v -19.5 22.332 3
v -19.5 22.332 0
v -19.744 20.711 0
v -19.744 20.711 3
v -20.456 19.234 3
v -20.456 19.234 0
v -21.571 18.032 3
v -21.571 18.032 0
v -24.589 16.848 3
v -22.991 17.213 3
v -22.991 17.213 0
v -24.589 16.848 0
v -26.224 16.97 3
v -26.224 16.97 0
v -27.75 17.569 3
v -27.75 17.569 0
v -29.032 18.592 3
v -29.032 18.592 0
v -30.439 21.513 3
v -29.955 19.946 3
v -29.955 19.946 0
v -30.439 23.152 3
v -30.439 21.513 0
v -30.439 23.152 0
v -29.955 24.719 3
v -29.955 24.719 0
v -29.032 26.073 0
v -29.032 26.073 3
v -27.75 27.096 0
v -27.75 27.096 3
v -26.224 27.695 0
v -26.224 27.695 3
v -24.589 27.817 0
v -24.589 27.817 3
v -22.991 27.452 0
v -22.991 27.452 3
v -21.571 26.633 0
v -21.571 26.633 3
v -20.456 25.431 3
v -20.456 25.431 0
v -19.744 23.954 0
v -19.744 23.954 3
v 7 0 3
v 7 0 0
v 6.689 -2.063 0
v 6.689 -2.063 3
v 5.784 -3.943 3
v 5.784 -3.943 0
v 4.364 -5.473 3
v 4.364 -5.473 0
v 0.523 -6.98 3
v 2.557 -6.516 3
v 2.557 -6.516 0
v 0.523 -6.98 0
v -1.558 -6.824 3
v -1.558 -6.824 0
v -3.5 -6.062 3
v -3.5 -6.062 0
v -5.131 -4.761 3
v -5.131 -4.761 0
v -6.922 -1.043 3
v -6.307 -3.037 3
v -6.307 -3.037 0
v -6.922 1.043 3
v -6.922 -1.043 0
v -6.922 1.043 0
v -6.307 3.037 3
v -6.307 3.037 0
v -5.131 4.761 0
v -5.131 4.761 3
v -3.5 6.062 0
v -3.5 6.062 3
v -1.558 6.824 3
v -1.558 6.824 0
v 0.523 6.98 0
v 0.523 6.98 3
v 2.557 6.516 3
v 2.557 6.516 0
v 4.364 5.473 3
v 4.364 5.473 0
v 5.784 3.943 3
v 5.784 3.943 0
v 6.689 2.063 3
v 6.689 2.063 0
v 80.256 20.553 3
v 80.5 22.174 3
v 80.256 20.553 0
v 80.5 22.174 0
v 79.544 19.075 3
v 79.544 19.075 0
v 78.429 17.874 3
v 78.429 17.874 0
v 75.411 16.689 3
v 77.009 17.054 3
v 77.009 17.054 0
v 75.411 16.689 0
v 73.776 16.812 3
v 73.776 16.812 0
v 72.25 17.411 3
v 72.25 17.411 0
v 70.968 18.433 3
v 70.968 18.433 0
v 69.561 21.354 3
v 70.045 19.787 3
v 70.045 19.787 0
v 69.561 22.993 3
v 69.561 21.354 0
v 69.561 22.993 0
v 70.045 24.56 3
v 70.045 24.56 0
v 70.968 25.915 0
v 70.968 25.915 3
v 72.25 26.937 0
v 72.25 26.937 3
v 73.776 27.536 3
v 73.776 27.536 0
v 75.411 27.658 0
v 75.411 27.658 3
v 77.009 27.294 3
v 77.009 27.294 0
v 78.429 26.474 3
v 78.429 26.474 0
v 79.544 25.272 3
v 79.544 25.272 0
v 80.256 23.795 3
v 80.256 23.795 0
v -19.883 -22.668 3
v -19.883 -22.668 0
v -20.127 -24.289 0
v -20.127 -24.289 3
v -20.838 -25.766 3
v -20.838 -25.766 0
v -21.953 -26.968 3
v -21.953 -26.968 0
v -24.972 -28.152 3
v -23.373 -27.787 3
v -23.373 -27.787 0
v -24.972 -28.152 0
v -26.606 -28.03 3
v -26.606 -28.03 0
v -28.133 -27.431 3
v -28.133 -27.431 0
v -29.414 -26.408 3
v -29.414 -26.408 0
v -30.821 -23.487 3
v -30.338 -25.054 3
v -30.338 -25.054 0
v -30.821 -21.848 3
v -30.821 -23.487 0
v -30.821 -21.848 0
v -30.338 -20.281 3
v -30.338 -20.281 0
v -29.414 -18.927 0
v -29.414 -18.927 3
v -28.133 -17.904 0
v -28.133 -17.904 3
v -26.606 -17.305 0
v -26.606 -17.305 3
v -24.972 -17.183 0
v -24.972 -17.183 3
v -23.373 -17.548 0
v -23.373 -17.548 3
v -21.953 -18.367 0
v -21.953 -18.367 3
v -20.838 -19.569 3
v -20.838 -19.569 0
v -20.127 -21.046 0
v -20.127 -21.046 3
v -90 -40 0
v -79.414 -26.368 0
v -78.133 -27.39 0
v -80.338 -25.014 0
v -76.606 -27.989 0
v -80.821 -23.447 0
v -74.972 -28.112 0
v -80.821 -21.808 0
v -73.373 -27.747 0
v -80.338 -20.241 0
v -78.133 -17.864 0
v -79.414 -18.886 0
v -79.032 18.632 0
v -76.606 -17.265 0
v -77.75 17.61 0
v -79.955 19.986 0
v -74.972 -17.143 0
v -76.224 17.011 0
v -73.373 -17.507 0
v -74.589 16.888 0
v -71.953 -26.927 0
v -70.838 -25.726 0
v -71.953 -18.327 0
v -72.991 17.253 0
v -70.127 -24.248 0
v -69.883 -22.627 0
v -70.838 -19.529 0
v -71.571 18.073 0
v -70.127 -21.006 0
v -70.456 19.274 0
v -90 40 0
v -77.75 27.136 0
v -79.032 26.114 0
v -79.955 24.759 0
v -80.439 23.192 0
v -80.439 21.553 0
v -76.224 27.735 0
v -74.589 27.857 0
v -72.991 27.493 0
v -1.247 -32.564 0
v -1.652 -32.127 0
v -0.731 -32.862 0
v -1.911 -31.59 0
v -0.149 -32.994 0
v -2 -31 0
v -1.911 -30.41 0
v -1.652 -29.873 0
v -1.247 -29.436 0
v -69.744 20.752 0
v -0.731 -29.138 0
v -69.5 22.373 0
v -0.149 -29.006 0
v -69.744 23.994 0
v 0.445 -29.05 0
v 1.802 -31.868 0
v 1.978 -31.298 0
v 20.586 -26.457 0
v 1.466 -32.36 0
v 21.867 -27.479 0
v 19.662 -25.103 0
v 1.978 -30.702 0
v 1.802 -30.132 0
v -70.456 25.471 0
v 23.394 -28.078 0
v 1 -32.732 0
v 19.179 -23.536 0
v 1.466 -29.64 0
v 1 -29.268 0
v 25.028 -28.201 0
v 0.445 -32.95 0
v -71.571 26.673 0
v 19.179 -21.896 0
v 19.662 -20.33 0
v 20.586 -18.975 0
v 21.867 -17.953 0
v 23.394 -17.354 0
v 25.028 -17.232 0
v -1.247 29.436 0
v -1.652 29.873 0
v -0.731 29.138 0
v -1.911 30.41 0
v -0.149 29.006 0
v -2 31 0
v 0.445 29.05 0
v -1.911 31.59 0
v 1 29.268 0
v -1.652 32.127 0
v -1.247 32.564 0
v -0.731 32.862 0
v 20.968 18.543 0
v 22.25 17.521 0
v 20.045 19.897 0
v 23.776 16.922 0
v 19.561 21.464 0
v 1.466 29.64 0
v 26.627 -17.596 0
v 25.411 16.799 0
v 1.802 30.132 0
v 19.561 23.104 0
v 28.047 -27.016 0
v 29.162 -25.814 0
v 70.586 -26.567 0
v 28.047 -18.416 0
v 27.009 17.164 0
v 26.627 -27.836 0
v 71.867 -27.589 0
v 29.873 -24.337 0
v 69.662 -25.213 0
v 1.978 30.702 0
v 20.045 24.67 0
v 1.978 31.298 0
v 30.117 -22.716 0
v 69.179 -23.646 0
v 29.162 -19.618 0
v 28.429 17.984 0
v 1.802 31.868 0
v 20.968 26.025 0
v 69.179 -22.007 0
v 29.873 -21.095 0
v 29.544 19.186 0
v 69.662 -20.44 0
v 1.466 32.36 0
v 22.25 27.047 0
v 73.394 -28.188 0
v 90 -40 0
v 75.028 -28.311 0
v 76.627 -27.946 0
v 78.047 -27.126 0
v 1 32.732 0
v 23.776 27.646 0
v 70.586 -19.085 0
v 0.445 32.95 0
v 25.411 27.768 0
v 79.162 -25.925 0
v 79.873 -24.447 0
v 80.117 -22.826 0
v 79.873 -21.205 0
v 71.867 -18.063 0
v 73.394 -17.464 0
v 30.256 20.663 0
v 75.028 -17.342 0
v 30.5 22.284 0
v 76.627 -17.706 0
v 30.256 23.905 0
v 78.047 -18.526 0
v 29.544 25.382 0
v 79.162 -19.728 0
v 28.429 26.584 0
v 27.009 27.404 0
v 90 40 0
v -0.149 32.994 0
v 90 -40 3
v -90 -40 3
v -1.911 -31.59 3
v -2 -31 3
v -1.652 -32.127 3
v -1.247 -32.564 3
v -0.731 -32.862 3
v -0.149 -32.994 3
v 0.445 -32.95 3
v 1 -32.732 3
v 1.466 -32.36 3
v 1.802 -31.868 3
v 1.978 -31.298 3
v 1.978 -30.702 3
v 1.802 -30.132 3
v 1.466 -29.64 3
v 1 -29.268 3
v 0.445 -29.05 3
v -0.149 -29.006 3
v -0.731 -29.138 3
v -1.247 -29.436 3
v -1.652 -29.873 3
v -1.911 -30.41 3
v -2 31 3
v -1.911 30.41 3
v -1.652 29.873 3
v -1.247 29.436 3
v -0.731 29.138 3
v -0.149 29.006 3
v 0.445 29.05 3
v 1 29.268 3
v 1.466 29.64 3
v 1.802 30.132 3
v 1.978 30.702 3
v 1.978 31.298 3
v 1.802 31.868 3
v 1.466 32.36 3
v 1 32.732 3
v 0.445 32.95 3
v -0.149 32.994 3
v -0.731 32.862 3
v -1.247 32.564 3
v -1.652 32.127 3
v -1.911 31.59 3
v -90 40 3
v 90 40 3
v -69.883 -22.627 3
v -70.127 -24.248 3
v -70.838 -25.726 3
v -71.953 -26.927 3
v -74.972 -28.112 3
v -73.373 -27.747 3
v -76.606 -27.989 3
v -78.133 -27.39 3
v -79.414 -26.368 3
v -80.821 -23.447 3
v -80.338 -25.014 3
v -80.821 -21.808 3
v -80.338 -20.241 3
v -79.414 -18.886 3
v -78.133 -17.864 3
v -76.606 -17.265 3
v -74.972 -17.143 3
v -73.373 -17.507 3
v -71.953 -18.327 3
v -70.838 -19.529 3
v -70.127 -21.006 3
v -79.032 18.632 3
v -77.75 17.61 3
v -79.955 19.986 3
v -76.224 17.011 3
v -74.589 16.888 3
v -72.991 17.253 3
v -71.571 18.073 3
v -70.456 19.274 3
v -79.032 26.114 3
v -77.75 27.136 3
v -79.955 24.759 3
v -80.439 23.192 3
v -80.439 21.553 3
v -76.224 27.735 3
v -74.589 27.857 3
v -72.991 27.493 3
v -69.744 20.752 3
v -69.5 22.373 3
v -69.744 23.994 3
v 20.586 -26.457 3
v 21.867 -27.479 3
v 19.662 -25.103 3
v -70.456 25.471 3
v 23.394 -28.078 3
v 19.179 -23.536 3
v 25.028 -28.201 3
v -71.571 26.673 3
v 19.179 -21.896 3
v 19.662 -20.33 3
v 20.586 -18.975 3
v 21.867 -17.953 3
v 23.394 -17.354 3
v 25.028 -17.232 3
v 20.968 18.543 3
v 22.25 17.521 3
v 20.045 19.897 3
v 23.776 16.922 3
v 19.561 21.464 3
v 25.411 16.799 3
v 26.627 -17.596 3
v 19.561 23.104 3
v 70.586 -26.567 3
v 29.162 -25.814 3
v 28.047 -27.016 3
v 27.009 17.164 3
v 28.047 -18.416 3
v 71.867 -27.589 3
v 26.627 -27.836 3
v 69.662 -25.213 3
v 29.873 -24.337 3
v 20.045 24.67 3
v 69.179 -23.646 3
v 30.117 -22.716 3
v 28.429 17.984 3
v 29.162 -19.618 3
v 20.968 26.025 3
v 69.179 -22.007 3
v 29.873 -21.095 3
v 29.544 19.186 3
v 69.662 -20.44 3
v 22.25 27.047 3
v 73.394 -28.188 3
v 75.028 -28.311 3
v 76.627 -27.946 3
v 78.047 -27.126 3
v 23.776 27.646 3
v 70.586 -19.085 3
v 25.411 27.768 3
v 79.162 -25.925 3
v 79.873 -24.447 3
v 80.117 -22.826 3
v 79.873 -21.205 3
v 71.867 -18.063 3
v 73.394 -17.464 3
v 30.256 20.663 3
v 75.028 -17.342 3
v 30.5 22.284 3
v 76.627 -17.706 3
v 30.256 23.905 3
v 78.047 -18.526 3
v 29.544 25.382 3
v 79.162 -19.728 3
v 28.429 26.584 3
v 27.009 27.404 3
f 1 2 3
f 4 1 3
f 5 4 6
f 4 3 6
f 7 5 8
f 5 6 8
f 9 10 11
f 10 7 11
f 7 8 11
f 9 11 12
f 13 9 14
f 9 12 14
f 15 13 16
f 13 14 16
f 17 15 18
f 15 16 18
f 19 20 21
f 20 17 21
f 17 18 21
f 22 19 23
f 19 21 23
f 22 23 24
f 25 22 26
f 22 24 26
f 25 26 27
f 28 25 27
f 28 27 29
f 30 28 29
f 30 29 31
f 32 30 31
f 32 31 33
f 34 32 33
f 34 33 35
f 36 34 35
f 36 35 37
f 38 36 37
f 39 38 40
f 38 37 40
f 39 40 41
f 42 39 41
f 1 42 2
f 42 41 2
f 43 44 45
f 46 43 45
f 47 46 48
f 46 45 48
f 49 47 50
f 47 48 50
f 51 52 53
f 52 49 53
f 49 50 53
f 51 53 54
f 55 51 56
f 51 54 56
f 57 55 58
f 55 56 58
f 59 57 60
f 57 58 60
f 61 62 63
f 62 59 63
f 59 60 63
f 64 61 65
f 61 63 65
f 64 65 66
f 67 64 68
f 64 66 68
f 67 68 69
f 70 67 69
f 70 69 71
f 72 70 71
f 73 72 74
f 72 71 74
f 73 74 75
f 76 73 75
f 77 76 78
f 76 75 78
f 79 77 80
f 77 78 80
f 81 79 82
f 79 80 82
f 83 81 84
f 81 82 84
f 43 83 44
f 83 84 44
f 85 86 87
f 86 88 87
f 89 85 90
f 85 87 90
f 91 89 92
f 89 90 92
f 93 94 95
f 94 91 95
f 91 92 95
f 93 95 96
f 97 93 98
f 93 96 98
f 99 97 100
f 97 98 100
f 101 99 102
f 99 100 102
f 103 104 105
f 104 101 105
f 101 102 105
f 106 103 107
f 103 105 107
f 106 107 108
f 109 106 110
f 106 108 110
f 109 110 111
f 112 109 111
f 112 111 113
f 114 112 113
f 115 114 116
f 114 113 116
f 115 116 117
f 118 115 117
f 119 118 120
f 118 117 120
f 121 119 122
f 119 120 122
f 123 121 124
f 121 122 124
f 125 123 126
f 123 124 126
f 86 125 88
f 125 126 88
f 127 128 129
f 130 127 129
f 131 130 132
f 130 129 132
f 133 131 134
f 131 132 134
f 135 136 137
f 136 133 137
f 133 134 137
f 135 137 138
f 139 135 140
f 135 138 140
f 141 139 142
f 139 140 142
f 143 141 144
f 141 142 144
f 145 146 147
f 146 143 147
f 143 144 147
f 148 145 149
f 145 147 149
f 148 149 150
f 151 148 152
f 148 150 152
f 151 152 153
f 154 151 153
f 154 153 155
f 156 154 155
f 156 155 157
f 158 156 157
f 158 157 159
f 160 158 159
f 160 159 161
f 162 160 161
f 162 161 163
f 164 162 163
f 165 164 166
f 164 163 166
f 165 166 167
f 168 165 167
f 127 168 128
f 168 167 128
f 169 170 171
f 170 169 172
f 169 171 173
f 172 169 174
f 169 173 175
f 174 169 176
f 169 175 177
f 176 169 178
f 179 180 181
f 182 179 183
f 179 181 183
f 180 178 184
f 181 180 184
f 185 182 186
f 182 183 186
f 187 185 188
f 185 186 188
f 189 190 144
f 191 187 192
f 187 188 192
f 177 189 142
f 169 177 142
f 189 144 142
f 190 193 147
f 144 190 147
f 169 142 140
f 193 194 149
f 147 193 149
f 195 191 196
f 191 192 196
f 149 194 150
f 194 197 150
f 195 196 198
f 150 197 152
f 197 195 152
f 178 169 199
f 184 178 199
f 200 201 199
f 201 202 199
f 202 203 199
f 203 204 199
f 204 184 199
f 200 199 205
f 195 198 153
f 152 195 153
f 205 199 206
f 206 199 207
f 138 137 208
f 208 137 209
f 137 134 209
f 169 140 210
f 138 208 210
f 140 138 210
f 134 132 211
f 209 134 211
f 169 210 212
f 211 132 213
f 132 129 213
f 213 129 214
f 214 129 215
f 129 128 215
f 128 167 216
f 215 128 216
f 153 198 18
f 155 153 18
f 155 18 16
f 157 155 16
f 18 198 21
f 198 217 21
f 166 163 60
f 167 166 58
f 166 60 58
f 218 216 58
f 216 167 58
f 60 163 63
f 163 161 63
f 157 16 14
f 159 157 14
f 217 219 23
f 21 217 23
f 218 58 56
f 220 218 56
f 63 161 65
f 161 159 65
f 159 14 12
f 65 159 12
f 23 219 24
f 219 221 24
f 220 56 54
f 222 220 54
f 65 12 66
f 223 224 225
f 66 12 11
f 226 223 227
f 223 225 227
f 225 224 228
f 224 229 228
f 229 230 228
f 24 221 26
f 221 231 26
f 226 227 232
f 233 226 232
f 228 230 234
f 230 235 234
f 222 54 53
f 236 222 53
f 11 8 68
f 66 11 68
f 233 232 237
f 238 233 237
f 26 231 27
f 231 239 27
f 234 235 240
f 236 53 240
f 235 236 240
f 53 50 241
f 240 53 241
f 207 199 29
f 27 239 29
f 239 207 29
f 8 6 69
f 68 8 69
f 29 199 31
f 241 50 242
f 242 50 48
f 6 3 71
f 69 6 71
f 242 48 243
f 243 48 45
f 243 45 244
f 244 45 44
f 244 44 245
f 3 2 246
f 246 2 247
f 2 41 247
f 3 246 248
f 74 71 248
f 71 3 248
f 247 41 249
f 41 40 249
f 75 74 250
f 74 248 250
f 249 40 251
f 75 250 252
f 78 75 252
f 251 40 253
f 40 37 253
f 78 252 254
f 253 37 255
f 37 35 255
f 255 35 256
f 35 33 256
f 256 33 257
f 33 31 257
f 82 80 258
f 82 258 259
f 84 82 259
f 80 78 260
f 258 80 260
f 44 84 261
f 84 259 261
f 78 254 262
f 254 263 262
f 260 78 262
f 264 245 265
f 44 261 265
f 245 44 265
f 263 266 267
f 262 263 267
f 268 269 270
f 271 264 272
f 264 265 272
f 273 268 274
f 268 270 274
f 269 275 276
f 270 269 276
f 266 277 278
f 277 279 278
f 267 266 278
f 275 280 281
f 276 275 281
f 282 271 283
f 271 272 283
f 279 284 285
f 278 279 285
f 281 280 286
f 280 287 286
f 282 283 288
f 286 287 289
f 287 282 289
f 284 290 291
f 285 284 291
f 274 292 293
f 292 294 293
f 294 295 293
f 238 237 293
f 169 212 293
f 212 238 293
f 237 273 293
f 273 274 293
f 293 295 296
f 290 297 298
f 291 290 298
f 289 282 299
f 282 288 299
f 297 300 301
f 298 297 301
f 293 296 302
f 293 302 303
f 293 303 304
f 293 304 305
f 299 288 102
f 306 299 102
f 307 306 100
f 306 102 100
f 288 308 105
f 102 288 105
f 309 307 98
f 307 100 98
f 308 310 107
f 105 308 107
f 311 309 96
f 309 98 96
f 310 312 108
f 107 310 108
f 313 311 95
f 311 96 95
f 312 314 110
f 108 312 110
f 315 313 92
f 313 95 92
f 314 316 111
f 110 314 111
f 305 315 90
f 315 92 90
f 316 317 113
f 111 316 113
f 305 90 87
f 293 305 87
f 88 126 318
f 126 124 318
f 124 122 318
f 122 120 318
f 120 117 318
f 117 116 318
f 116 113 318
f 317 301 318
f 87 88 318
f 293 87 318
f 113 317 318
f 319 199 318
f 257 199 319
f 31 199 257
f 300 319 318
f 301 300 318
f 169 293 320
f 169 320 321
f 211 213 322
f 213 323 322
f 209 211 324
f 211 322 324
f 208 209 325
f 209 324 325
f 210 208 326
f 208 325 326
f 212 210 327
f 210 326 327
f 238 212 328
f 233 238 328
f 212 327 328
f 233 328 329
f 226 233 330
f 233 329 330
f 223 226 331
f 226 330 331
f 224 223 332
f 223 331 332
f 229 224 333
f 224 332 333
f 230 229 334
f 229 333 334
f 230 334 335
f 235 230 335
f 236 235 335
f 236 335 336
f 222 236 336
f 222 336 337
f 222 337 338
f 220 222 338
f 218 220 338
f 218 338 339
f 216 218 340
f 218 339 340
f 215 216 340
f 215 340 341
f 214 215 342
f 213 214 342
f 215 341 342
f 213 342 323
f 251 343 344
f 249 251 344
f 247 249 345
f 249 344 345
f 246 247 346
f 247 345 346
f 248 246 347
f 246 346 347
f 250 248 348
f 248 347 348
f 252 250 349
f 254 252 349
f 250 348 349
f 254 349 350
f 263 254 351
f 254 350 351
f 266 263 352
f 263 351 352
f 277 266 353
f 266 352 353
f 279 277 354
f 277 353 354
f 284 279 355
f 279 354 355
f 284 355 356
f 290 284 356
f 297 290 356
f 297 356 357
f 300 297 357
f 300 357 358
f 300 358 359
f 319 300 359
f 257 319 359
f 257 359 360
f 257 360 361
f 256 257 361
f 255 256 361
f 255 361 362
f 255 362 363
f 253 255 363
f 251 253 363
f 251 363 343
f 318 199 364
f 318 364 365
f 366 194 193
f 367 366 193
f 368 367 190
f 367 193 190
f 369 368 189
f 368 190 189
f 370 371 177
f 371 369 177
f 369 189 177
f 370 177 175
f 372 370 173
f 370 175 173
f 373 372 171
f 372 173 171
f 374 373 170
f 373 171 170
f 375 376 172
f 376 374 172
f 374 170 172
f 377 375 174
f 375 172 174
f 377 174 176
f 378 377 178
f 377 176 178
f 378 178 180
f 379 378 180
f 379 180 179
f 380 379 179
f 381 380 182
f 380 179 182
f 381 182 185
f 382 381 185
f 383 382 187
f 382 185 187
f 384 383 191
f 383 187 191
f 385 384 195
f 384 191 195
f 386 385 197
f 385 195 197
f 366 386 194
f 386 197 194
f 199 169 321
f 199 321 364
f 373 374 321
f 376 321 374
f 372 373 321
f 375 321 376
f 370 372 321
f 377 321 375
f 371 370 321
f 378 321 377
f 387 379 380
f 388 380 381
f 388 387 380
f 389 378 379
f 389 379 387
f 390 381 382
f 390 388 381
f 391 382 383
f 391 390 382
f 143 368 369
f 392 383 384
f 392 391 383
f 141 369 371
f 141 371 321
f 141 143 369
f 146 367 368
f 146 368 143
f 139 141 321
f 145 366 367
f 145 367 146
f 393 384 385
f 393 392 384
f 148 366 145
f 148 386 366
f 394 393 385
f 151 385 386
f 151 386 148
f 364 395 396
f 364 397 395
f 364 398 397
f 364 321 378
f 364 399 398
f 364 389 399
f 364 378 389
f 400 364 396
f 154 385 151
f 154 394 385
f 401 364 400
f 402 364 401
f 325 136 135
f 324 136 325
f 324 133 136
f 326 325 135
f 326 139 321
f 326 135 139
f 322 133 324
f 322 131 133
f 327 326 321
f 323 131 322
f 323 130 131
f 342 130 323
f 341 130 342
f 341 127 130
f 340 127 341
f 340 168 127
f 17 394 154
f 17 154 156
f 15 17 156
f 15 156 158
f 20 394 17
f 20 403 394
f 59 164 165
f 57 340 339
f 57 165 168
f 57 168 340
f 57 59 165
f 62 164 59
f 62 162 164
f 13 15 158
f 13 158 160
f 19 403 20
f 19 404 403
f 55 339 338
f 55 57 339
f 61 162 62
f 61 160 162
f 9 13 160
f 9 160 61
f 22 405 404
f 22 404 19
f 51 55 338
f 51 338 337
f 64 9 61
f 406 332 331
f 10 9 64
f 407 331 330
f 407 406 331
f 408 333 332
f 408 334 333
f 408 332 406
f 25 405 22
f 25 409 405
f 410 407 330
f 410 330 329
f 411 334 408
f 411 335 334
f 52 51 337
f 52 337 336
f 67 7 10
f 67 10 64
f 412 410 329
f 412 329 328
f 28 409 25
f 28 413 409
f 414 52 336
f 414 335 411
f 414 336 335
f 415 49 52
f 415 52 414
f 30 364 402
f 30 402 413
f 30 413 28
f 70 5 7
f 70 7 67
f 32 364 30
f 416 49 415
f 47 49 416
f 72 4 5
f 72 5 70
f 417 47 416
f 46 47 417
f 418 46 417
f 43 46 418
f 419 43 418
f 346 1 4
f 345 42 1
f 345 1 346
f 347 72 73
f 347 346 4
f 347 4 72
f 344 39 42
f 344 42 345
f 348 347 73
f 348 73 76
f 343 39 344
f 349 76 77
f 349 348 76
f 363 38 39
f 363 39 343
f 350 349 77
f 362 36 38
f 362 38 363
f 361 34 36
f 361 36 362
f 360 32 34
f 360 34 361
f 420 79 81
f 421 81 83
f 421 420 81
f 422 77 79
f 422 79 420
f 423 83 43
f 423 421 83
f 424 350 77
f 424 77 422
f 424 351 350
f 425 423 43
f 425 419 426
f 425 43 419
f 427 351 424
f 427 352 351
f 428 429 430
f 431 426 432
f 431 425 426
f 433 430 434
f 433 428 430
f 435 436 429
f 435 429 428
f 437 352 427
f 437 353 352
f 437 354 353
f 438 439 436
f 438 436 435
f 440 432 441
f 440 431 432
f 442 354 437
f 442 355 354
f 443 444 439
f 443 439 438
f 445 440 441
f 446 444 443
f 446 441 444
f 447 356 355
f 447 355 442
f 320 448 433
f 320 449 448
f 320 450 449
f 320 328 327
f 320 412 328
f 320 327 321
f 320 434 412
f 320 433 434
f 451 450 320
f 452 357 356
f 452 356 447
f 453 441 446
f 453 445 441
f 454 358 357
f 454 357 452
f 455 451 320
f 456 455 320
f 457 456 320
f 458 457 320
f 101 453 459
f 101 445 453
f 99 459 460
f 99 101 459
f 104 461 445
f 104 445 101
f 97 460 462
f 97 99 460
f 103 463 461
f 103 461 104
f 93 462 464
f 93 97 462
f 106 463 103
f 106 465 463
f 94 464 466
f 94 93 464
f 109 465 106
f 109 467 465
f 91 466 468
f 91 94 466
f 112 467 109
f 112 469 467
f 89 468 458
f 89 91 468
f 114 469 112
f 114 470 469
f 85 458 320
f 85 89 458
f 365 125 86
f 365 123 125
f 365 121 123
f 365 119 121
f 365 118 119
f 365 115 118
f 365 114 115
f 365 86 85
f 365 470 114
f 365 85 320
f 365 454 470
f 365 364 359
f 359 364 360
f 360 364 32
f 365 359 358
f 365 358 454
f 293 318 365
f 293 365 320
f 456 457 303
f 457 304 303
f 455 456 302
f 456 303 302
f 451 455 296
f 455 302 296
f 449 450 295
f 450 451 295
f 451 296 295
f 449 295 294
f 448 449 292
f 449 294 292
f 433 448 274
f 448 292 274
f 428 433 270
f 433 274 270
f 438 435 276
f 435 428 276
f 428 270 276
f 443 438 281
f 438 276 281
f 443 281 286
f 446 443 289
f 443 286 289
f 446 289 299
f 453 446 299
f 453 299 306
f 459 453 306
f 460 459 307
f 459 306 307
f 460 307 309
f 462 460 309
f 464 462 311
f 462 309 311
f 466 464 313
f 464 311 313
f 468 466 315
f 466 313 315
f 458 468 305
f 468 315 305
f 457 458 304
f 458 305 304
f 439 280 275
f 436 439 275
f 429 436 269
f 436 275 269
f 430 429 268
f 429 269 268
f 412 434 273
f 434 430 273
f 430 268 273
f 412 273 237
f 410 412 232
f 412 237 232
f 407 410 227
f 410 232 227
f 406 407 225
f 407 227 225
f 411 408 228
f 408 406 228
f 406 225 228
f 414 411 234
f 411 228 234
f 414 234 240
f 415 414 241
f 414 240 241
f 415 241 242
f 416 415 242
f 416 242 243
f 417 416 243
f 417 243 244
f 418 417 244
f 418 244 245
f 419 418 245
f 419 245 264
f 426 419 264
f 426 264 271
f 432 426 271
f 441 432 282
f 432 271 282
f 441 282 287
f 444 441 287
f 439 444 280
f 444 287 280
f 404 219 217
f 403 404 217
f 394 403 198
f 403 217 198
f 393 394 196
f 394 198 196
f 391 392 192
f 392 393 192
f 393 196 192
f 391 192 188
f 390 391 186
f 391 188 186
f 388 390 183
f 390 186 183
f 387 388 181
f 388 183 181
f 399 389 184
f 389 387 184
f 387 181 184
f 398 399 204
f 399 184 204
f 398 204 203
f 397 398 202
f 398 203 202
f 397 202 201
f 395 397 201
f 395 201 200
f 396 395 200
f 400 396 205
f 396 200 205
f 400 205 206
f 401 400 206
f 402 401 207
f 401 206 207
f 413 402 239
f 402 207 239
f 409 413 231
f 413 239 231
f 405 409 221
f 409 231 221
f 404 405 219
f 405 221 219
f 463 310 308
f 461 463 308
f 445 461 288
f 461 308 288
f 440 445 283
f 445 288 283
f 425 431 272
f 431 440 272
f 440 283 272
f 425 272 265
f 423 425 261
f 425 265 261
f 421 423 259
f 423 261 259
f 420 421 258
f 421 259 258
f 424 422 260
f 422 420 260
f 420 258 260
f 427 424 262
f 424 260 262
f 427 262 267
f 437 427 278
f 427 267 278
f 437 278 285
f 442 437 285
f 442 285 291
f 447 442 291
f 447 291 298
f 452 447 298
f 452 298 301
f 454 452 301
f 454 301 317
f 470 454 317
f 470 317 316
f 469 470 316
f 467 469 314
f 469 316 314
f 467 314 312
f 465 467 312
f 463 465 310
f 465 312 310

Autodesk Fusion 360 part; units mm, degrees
sketch "Sketch1" plane through (0, 0, 0) normal (0, 0, 1) x (1, 0, 0)
  line L0 (-90, 40) -> (90, 40)
  line L1 (90, 40) -> (90, -40)
  line L2 (90, -40) -> (-90, -40)
  line L3 (-90, -40) -> (-90, 40)
  line L4 (-90, 40) -> (90, -40) construction
  line L5 (90, 40) -> (-90, -40) construction
  circle A0 centre (-25, 22.3325) radius 5.5
  circle A1 centre (-75, 22.3727) radius 5.5
  circle A2 centre (-25.3826, -22.6675) radius 5.5
  circle A3 centre (75, 22.1737) radius 5.5
  circle A4 centre (25, 22.2838) radius 5.5
  circle A5 centre (-75.3826, -22.6273) radius 5.5
  circle A6 centre (24.6174, -22.7162) radius 5.5
  circle A7 centre (74.6174, -22.8263) radius 5.5
  circle A8 centre (0, 0) radius 7
  point P0 (-90, 40)
  point P1 (-24.0015, 35.2175)
  dimension "d1" = 80
  dimension "d2" = 180
  dimension "d3" = 11
  dimension "d4" = 11
  dimension "d5" = 11
  dimension "d7" = 11
  dimension "d8" = 11
  dimension "d9" = 11
  dimension "d11" = 11
  dimension "d12" = 11
  dimension "d15" = 50
  dimension "d16" = 50
  dimension "d17" = 50
  dimension "d18" = 50
  dimension "d19" = 50
  dimension "d20" = 50
  dimension "d21" = 45
  dimension "d22" = 45
  dimension "d23" = 45
  dimension "d25" = 45
  dimension "d26" = 14
extrude "Extrude1" add sketch "Sketch1" along normal blind 7
sketch "Sketch3" plane through (0, 0, 7) normal (0, 0, 1) x (-1, 0, 0)
  circle A0 centre (75.3826, 22.6273) radius 5.5
  circle A1 centre (-74.6174, 22.8263) radius 5.5
  circle A2 centre (0, 0) radius 7
  circle A3 centre (75, -22.3727) radius 5.5
  circle A4 centre (25, -22.3325) radius 5.5
  circle A5 centre (-75, -22.1737) radius 5.5
  circle A6 centre (-24.6174, 22.7162) radius 5.5
  circle A7 centre (-25, -22.2838) radius 5.5
  circle A8 centre (25.3826, 22.6675) radius 5.5
  line L0 (90, 40) -> (-90, 40)
  line L1 (-90, 40) -> (-90, -40)
  line L2 (-90, -40) -> (90, -40)
  line L3 (90, -40) -> (90, 40)
  circle A9 centre (0, -31) radius 2
  line L4 (-20, 0) -> (-2.5, 0)
  circle A10 centre (0, 31) radius 2
  dimension "d29" = 4
  dimension "d30" = 31
extrude "Extrude2" cut sketch "Sketch3" against normal blind 14 contours A9 | A10
extrude "Extrude3" cut 1 faces at (-43.1381, 6.099, 7) along direction (0, 0, -1) blind 4
equation "d30 = 27 mm + 4 mm"
